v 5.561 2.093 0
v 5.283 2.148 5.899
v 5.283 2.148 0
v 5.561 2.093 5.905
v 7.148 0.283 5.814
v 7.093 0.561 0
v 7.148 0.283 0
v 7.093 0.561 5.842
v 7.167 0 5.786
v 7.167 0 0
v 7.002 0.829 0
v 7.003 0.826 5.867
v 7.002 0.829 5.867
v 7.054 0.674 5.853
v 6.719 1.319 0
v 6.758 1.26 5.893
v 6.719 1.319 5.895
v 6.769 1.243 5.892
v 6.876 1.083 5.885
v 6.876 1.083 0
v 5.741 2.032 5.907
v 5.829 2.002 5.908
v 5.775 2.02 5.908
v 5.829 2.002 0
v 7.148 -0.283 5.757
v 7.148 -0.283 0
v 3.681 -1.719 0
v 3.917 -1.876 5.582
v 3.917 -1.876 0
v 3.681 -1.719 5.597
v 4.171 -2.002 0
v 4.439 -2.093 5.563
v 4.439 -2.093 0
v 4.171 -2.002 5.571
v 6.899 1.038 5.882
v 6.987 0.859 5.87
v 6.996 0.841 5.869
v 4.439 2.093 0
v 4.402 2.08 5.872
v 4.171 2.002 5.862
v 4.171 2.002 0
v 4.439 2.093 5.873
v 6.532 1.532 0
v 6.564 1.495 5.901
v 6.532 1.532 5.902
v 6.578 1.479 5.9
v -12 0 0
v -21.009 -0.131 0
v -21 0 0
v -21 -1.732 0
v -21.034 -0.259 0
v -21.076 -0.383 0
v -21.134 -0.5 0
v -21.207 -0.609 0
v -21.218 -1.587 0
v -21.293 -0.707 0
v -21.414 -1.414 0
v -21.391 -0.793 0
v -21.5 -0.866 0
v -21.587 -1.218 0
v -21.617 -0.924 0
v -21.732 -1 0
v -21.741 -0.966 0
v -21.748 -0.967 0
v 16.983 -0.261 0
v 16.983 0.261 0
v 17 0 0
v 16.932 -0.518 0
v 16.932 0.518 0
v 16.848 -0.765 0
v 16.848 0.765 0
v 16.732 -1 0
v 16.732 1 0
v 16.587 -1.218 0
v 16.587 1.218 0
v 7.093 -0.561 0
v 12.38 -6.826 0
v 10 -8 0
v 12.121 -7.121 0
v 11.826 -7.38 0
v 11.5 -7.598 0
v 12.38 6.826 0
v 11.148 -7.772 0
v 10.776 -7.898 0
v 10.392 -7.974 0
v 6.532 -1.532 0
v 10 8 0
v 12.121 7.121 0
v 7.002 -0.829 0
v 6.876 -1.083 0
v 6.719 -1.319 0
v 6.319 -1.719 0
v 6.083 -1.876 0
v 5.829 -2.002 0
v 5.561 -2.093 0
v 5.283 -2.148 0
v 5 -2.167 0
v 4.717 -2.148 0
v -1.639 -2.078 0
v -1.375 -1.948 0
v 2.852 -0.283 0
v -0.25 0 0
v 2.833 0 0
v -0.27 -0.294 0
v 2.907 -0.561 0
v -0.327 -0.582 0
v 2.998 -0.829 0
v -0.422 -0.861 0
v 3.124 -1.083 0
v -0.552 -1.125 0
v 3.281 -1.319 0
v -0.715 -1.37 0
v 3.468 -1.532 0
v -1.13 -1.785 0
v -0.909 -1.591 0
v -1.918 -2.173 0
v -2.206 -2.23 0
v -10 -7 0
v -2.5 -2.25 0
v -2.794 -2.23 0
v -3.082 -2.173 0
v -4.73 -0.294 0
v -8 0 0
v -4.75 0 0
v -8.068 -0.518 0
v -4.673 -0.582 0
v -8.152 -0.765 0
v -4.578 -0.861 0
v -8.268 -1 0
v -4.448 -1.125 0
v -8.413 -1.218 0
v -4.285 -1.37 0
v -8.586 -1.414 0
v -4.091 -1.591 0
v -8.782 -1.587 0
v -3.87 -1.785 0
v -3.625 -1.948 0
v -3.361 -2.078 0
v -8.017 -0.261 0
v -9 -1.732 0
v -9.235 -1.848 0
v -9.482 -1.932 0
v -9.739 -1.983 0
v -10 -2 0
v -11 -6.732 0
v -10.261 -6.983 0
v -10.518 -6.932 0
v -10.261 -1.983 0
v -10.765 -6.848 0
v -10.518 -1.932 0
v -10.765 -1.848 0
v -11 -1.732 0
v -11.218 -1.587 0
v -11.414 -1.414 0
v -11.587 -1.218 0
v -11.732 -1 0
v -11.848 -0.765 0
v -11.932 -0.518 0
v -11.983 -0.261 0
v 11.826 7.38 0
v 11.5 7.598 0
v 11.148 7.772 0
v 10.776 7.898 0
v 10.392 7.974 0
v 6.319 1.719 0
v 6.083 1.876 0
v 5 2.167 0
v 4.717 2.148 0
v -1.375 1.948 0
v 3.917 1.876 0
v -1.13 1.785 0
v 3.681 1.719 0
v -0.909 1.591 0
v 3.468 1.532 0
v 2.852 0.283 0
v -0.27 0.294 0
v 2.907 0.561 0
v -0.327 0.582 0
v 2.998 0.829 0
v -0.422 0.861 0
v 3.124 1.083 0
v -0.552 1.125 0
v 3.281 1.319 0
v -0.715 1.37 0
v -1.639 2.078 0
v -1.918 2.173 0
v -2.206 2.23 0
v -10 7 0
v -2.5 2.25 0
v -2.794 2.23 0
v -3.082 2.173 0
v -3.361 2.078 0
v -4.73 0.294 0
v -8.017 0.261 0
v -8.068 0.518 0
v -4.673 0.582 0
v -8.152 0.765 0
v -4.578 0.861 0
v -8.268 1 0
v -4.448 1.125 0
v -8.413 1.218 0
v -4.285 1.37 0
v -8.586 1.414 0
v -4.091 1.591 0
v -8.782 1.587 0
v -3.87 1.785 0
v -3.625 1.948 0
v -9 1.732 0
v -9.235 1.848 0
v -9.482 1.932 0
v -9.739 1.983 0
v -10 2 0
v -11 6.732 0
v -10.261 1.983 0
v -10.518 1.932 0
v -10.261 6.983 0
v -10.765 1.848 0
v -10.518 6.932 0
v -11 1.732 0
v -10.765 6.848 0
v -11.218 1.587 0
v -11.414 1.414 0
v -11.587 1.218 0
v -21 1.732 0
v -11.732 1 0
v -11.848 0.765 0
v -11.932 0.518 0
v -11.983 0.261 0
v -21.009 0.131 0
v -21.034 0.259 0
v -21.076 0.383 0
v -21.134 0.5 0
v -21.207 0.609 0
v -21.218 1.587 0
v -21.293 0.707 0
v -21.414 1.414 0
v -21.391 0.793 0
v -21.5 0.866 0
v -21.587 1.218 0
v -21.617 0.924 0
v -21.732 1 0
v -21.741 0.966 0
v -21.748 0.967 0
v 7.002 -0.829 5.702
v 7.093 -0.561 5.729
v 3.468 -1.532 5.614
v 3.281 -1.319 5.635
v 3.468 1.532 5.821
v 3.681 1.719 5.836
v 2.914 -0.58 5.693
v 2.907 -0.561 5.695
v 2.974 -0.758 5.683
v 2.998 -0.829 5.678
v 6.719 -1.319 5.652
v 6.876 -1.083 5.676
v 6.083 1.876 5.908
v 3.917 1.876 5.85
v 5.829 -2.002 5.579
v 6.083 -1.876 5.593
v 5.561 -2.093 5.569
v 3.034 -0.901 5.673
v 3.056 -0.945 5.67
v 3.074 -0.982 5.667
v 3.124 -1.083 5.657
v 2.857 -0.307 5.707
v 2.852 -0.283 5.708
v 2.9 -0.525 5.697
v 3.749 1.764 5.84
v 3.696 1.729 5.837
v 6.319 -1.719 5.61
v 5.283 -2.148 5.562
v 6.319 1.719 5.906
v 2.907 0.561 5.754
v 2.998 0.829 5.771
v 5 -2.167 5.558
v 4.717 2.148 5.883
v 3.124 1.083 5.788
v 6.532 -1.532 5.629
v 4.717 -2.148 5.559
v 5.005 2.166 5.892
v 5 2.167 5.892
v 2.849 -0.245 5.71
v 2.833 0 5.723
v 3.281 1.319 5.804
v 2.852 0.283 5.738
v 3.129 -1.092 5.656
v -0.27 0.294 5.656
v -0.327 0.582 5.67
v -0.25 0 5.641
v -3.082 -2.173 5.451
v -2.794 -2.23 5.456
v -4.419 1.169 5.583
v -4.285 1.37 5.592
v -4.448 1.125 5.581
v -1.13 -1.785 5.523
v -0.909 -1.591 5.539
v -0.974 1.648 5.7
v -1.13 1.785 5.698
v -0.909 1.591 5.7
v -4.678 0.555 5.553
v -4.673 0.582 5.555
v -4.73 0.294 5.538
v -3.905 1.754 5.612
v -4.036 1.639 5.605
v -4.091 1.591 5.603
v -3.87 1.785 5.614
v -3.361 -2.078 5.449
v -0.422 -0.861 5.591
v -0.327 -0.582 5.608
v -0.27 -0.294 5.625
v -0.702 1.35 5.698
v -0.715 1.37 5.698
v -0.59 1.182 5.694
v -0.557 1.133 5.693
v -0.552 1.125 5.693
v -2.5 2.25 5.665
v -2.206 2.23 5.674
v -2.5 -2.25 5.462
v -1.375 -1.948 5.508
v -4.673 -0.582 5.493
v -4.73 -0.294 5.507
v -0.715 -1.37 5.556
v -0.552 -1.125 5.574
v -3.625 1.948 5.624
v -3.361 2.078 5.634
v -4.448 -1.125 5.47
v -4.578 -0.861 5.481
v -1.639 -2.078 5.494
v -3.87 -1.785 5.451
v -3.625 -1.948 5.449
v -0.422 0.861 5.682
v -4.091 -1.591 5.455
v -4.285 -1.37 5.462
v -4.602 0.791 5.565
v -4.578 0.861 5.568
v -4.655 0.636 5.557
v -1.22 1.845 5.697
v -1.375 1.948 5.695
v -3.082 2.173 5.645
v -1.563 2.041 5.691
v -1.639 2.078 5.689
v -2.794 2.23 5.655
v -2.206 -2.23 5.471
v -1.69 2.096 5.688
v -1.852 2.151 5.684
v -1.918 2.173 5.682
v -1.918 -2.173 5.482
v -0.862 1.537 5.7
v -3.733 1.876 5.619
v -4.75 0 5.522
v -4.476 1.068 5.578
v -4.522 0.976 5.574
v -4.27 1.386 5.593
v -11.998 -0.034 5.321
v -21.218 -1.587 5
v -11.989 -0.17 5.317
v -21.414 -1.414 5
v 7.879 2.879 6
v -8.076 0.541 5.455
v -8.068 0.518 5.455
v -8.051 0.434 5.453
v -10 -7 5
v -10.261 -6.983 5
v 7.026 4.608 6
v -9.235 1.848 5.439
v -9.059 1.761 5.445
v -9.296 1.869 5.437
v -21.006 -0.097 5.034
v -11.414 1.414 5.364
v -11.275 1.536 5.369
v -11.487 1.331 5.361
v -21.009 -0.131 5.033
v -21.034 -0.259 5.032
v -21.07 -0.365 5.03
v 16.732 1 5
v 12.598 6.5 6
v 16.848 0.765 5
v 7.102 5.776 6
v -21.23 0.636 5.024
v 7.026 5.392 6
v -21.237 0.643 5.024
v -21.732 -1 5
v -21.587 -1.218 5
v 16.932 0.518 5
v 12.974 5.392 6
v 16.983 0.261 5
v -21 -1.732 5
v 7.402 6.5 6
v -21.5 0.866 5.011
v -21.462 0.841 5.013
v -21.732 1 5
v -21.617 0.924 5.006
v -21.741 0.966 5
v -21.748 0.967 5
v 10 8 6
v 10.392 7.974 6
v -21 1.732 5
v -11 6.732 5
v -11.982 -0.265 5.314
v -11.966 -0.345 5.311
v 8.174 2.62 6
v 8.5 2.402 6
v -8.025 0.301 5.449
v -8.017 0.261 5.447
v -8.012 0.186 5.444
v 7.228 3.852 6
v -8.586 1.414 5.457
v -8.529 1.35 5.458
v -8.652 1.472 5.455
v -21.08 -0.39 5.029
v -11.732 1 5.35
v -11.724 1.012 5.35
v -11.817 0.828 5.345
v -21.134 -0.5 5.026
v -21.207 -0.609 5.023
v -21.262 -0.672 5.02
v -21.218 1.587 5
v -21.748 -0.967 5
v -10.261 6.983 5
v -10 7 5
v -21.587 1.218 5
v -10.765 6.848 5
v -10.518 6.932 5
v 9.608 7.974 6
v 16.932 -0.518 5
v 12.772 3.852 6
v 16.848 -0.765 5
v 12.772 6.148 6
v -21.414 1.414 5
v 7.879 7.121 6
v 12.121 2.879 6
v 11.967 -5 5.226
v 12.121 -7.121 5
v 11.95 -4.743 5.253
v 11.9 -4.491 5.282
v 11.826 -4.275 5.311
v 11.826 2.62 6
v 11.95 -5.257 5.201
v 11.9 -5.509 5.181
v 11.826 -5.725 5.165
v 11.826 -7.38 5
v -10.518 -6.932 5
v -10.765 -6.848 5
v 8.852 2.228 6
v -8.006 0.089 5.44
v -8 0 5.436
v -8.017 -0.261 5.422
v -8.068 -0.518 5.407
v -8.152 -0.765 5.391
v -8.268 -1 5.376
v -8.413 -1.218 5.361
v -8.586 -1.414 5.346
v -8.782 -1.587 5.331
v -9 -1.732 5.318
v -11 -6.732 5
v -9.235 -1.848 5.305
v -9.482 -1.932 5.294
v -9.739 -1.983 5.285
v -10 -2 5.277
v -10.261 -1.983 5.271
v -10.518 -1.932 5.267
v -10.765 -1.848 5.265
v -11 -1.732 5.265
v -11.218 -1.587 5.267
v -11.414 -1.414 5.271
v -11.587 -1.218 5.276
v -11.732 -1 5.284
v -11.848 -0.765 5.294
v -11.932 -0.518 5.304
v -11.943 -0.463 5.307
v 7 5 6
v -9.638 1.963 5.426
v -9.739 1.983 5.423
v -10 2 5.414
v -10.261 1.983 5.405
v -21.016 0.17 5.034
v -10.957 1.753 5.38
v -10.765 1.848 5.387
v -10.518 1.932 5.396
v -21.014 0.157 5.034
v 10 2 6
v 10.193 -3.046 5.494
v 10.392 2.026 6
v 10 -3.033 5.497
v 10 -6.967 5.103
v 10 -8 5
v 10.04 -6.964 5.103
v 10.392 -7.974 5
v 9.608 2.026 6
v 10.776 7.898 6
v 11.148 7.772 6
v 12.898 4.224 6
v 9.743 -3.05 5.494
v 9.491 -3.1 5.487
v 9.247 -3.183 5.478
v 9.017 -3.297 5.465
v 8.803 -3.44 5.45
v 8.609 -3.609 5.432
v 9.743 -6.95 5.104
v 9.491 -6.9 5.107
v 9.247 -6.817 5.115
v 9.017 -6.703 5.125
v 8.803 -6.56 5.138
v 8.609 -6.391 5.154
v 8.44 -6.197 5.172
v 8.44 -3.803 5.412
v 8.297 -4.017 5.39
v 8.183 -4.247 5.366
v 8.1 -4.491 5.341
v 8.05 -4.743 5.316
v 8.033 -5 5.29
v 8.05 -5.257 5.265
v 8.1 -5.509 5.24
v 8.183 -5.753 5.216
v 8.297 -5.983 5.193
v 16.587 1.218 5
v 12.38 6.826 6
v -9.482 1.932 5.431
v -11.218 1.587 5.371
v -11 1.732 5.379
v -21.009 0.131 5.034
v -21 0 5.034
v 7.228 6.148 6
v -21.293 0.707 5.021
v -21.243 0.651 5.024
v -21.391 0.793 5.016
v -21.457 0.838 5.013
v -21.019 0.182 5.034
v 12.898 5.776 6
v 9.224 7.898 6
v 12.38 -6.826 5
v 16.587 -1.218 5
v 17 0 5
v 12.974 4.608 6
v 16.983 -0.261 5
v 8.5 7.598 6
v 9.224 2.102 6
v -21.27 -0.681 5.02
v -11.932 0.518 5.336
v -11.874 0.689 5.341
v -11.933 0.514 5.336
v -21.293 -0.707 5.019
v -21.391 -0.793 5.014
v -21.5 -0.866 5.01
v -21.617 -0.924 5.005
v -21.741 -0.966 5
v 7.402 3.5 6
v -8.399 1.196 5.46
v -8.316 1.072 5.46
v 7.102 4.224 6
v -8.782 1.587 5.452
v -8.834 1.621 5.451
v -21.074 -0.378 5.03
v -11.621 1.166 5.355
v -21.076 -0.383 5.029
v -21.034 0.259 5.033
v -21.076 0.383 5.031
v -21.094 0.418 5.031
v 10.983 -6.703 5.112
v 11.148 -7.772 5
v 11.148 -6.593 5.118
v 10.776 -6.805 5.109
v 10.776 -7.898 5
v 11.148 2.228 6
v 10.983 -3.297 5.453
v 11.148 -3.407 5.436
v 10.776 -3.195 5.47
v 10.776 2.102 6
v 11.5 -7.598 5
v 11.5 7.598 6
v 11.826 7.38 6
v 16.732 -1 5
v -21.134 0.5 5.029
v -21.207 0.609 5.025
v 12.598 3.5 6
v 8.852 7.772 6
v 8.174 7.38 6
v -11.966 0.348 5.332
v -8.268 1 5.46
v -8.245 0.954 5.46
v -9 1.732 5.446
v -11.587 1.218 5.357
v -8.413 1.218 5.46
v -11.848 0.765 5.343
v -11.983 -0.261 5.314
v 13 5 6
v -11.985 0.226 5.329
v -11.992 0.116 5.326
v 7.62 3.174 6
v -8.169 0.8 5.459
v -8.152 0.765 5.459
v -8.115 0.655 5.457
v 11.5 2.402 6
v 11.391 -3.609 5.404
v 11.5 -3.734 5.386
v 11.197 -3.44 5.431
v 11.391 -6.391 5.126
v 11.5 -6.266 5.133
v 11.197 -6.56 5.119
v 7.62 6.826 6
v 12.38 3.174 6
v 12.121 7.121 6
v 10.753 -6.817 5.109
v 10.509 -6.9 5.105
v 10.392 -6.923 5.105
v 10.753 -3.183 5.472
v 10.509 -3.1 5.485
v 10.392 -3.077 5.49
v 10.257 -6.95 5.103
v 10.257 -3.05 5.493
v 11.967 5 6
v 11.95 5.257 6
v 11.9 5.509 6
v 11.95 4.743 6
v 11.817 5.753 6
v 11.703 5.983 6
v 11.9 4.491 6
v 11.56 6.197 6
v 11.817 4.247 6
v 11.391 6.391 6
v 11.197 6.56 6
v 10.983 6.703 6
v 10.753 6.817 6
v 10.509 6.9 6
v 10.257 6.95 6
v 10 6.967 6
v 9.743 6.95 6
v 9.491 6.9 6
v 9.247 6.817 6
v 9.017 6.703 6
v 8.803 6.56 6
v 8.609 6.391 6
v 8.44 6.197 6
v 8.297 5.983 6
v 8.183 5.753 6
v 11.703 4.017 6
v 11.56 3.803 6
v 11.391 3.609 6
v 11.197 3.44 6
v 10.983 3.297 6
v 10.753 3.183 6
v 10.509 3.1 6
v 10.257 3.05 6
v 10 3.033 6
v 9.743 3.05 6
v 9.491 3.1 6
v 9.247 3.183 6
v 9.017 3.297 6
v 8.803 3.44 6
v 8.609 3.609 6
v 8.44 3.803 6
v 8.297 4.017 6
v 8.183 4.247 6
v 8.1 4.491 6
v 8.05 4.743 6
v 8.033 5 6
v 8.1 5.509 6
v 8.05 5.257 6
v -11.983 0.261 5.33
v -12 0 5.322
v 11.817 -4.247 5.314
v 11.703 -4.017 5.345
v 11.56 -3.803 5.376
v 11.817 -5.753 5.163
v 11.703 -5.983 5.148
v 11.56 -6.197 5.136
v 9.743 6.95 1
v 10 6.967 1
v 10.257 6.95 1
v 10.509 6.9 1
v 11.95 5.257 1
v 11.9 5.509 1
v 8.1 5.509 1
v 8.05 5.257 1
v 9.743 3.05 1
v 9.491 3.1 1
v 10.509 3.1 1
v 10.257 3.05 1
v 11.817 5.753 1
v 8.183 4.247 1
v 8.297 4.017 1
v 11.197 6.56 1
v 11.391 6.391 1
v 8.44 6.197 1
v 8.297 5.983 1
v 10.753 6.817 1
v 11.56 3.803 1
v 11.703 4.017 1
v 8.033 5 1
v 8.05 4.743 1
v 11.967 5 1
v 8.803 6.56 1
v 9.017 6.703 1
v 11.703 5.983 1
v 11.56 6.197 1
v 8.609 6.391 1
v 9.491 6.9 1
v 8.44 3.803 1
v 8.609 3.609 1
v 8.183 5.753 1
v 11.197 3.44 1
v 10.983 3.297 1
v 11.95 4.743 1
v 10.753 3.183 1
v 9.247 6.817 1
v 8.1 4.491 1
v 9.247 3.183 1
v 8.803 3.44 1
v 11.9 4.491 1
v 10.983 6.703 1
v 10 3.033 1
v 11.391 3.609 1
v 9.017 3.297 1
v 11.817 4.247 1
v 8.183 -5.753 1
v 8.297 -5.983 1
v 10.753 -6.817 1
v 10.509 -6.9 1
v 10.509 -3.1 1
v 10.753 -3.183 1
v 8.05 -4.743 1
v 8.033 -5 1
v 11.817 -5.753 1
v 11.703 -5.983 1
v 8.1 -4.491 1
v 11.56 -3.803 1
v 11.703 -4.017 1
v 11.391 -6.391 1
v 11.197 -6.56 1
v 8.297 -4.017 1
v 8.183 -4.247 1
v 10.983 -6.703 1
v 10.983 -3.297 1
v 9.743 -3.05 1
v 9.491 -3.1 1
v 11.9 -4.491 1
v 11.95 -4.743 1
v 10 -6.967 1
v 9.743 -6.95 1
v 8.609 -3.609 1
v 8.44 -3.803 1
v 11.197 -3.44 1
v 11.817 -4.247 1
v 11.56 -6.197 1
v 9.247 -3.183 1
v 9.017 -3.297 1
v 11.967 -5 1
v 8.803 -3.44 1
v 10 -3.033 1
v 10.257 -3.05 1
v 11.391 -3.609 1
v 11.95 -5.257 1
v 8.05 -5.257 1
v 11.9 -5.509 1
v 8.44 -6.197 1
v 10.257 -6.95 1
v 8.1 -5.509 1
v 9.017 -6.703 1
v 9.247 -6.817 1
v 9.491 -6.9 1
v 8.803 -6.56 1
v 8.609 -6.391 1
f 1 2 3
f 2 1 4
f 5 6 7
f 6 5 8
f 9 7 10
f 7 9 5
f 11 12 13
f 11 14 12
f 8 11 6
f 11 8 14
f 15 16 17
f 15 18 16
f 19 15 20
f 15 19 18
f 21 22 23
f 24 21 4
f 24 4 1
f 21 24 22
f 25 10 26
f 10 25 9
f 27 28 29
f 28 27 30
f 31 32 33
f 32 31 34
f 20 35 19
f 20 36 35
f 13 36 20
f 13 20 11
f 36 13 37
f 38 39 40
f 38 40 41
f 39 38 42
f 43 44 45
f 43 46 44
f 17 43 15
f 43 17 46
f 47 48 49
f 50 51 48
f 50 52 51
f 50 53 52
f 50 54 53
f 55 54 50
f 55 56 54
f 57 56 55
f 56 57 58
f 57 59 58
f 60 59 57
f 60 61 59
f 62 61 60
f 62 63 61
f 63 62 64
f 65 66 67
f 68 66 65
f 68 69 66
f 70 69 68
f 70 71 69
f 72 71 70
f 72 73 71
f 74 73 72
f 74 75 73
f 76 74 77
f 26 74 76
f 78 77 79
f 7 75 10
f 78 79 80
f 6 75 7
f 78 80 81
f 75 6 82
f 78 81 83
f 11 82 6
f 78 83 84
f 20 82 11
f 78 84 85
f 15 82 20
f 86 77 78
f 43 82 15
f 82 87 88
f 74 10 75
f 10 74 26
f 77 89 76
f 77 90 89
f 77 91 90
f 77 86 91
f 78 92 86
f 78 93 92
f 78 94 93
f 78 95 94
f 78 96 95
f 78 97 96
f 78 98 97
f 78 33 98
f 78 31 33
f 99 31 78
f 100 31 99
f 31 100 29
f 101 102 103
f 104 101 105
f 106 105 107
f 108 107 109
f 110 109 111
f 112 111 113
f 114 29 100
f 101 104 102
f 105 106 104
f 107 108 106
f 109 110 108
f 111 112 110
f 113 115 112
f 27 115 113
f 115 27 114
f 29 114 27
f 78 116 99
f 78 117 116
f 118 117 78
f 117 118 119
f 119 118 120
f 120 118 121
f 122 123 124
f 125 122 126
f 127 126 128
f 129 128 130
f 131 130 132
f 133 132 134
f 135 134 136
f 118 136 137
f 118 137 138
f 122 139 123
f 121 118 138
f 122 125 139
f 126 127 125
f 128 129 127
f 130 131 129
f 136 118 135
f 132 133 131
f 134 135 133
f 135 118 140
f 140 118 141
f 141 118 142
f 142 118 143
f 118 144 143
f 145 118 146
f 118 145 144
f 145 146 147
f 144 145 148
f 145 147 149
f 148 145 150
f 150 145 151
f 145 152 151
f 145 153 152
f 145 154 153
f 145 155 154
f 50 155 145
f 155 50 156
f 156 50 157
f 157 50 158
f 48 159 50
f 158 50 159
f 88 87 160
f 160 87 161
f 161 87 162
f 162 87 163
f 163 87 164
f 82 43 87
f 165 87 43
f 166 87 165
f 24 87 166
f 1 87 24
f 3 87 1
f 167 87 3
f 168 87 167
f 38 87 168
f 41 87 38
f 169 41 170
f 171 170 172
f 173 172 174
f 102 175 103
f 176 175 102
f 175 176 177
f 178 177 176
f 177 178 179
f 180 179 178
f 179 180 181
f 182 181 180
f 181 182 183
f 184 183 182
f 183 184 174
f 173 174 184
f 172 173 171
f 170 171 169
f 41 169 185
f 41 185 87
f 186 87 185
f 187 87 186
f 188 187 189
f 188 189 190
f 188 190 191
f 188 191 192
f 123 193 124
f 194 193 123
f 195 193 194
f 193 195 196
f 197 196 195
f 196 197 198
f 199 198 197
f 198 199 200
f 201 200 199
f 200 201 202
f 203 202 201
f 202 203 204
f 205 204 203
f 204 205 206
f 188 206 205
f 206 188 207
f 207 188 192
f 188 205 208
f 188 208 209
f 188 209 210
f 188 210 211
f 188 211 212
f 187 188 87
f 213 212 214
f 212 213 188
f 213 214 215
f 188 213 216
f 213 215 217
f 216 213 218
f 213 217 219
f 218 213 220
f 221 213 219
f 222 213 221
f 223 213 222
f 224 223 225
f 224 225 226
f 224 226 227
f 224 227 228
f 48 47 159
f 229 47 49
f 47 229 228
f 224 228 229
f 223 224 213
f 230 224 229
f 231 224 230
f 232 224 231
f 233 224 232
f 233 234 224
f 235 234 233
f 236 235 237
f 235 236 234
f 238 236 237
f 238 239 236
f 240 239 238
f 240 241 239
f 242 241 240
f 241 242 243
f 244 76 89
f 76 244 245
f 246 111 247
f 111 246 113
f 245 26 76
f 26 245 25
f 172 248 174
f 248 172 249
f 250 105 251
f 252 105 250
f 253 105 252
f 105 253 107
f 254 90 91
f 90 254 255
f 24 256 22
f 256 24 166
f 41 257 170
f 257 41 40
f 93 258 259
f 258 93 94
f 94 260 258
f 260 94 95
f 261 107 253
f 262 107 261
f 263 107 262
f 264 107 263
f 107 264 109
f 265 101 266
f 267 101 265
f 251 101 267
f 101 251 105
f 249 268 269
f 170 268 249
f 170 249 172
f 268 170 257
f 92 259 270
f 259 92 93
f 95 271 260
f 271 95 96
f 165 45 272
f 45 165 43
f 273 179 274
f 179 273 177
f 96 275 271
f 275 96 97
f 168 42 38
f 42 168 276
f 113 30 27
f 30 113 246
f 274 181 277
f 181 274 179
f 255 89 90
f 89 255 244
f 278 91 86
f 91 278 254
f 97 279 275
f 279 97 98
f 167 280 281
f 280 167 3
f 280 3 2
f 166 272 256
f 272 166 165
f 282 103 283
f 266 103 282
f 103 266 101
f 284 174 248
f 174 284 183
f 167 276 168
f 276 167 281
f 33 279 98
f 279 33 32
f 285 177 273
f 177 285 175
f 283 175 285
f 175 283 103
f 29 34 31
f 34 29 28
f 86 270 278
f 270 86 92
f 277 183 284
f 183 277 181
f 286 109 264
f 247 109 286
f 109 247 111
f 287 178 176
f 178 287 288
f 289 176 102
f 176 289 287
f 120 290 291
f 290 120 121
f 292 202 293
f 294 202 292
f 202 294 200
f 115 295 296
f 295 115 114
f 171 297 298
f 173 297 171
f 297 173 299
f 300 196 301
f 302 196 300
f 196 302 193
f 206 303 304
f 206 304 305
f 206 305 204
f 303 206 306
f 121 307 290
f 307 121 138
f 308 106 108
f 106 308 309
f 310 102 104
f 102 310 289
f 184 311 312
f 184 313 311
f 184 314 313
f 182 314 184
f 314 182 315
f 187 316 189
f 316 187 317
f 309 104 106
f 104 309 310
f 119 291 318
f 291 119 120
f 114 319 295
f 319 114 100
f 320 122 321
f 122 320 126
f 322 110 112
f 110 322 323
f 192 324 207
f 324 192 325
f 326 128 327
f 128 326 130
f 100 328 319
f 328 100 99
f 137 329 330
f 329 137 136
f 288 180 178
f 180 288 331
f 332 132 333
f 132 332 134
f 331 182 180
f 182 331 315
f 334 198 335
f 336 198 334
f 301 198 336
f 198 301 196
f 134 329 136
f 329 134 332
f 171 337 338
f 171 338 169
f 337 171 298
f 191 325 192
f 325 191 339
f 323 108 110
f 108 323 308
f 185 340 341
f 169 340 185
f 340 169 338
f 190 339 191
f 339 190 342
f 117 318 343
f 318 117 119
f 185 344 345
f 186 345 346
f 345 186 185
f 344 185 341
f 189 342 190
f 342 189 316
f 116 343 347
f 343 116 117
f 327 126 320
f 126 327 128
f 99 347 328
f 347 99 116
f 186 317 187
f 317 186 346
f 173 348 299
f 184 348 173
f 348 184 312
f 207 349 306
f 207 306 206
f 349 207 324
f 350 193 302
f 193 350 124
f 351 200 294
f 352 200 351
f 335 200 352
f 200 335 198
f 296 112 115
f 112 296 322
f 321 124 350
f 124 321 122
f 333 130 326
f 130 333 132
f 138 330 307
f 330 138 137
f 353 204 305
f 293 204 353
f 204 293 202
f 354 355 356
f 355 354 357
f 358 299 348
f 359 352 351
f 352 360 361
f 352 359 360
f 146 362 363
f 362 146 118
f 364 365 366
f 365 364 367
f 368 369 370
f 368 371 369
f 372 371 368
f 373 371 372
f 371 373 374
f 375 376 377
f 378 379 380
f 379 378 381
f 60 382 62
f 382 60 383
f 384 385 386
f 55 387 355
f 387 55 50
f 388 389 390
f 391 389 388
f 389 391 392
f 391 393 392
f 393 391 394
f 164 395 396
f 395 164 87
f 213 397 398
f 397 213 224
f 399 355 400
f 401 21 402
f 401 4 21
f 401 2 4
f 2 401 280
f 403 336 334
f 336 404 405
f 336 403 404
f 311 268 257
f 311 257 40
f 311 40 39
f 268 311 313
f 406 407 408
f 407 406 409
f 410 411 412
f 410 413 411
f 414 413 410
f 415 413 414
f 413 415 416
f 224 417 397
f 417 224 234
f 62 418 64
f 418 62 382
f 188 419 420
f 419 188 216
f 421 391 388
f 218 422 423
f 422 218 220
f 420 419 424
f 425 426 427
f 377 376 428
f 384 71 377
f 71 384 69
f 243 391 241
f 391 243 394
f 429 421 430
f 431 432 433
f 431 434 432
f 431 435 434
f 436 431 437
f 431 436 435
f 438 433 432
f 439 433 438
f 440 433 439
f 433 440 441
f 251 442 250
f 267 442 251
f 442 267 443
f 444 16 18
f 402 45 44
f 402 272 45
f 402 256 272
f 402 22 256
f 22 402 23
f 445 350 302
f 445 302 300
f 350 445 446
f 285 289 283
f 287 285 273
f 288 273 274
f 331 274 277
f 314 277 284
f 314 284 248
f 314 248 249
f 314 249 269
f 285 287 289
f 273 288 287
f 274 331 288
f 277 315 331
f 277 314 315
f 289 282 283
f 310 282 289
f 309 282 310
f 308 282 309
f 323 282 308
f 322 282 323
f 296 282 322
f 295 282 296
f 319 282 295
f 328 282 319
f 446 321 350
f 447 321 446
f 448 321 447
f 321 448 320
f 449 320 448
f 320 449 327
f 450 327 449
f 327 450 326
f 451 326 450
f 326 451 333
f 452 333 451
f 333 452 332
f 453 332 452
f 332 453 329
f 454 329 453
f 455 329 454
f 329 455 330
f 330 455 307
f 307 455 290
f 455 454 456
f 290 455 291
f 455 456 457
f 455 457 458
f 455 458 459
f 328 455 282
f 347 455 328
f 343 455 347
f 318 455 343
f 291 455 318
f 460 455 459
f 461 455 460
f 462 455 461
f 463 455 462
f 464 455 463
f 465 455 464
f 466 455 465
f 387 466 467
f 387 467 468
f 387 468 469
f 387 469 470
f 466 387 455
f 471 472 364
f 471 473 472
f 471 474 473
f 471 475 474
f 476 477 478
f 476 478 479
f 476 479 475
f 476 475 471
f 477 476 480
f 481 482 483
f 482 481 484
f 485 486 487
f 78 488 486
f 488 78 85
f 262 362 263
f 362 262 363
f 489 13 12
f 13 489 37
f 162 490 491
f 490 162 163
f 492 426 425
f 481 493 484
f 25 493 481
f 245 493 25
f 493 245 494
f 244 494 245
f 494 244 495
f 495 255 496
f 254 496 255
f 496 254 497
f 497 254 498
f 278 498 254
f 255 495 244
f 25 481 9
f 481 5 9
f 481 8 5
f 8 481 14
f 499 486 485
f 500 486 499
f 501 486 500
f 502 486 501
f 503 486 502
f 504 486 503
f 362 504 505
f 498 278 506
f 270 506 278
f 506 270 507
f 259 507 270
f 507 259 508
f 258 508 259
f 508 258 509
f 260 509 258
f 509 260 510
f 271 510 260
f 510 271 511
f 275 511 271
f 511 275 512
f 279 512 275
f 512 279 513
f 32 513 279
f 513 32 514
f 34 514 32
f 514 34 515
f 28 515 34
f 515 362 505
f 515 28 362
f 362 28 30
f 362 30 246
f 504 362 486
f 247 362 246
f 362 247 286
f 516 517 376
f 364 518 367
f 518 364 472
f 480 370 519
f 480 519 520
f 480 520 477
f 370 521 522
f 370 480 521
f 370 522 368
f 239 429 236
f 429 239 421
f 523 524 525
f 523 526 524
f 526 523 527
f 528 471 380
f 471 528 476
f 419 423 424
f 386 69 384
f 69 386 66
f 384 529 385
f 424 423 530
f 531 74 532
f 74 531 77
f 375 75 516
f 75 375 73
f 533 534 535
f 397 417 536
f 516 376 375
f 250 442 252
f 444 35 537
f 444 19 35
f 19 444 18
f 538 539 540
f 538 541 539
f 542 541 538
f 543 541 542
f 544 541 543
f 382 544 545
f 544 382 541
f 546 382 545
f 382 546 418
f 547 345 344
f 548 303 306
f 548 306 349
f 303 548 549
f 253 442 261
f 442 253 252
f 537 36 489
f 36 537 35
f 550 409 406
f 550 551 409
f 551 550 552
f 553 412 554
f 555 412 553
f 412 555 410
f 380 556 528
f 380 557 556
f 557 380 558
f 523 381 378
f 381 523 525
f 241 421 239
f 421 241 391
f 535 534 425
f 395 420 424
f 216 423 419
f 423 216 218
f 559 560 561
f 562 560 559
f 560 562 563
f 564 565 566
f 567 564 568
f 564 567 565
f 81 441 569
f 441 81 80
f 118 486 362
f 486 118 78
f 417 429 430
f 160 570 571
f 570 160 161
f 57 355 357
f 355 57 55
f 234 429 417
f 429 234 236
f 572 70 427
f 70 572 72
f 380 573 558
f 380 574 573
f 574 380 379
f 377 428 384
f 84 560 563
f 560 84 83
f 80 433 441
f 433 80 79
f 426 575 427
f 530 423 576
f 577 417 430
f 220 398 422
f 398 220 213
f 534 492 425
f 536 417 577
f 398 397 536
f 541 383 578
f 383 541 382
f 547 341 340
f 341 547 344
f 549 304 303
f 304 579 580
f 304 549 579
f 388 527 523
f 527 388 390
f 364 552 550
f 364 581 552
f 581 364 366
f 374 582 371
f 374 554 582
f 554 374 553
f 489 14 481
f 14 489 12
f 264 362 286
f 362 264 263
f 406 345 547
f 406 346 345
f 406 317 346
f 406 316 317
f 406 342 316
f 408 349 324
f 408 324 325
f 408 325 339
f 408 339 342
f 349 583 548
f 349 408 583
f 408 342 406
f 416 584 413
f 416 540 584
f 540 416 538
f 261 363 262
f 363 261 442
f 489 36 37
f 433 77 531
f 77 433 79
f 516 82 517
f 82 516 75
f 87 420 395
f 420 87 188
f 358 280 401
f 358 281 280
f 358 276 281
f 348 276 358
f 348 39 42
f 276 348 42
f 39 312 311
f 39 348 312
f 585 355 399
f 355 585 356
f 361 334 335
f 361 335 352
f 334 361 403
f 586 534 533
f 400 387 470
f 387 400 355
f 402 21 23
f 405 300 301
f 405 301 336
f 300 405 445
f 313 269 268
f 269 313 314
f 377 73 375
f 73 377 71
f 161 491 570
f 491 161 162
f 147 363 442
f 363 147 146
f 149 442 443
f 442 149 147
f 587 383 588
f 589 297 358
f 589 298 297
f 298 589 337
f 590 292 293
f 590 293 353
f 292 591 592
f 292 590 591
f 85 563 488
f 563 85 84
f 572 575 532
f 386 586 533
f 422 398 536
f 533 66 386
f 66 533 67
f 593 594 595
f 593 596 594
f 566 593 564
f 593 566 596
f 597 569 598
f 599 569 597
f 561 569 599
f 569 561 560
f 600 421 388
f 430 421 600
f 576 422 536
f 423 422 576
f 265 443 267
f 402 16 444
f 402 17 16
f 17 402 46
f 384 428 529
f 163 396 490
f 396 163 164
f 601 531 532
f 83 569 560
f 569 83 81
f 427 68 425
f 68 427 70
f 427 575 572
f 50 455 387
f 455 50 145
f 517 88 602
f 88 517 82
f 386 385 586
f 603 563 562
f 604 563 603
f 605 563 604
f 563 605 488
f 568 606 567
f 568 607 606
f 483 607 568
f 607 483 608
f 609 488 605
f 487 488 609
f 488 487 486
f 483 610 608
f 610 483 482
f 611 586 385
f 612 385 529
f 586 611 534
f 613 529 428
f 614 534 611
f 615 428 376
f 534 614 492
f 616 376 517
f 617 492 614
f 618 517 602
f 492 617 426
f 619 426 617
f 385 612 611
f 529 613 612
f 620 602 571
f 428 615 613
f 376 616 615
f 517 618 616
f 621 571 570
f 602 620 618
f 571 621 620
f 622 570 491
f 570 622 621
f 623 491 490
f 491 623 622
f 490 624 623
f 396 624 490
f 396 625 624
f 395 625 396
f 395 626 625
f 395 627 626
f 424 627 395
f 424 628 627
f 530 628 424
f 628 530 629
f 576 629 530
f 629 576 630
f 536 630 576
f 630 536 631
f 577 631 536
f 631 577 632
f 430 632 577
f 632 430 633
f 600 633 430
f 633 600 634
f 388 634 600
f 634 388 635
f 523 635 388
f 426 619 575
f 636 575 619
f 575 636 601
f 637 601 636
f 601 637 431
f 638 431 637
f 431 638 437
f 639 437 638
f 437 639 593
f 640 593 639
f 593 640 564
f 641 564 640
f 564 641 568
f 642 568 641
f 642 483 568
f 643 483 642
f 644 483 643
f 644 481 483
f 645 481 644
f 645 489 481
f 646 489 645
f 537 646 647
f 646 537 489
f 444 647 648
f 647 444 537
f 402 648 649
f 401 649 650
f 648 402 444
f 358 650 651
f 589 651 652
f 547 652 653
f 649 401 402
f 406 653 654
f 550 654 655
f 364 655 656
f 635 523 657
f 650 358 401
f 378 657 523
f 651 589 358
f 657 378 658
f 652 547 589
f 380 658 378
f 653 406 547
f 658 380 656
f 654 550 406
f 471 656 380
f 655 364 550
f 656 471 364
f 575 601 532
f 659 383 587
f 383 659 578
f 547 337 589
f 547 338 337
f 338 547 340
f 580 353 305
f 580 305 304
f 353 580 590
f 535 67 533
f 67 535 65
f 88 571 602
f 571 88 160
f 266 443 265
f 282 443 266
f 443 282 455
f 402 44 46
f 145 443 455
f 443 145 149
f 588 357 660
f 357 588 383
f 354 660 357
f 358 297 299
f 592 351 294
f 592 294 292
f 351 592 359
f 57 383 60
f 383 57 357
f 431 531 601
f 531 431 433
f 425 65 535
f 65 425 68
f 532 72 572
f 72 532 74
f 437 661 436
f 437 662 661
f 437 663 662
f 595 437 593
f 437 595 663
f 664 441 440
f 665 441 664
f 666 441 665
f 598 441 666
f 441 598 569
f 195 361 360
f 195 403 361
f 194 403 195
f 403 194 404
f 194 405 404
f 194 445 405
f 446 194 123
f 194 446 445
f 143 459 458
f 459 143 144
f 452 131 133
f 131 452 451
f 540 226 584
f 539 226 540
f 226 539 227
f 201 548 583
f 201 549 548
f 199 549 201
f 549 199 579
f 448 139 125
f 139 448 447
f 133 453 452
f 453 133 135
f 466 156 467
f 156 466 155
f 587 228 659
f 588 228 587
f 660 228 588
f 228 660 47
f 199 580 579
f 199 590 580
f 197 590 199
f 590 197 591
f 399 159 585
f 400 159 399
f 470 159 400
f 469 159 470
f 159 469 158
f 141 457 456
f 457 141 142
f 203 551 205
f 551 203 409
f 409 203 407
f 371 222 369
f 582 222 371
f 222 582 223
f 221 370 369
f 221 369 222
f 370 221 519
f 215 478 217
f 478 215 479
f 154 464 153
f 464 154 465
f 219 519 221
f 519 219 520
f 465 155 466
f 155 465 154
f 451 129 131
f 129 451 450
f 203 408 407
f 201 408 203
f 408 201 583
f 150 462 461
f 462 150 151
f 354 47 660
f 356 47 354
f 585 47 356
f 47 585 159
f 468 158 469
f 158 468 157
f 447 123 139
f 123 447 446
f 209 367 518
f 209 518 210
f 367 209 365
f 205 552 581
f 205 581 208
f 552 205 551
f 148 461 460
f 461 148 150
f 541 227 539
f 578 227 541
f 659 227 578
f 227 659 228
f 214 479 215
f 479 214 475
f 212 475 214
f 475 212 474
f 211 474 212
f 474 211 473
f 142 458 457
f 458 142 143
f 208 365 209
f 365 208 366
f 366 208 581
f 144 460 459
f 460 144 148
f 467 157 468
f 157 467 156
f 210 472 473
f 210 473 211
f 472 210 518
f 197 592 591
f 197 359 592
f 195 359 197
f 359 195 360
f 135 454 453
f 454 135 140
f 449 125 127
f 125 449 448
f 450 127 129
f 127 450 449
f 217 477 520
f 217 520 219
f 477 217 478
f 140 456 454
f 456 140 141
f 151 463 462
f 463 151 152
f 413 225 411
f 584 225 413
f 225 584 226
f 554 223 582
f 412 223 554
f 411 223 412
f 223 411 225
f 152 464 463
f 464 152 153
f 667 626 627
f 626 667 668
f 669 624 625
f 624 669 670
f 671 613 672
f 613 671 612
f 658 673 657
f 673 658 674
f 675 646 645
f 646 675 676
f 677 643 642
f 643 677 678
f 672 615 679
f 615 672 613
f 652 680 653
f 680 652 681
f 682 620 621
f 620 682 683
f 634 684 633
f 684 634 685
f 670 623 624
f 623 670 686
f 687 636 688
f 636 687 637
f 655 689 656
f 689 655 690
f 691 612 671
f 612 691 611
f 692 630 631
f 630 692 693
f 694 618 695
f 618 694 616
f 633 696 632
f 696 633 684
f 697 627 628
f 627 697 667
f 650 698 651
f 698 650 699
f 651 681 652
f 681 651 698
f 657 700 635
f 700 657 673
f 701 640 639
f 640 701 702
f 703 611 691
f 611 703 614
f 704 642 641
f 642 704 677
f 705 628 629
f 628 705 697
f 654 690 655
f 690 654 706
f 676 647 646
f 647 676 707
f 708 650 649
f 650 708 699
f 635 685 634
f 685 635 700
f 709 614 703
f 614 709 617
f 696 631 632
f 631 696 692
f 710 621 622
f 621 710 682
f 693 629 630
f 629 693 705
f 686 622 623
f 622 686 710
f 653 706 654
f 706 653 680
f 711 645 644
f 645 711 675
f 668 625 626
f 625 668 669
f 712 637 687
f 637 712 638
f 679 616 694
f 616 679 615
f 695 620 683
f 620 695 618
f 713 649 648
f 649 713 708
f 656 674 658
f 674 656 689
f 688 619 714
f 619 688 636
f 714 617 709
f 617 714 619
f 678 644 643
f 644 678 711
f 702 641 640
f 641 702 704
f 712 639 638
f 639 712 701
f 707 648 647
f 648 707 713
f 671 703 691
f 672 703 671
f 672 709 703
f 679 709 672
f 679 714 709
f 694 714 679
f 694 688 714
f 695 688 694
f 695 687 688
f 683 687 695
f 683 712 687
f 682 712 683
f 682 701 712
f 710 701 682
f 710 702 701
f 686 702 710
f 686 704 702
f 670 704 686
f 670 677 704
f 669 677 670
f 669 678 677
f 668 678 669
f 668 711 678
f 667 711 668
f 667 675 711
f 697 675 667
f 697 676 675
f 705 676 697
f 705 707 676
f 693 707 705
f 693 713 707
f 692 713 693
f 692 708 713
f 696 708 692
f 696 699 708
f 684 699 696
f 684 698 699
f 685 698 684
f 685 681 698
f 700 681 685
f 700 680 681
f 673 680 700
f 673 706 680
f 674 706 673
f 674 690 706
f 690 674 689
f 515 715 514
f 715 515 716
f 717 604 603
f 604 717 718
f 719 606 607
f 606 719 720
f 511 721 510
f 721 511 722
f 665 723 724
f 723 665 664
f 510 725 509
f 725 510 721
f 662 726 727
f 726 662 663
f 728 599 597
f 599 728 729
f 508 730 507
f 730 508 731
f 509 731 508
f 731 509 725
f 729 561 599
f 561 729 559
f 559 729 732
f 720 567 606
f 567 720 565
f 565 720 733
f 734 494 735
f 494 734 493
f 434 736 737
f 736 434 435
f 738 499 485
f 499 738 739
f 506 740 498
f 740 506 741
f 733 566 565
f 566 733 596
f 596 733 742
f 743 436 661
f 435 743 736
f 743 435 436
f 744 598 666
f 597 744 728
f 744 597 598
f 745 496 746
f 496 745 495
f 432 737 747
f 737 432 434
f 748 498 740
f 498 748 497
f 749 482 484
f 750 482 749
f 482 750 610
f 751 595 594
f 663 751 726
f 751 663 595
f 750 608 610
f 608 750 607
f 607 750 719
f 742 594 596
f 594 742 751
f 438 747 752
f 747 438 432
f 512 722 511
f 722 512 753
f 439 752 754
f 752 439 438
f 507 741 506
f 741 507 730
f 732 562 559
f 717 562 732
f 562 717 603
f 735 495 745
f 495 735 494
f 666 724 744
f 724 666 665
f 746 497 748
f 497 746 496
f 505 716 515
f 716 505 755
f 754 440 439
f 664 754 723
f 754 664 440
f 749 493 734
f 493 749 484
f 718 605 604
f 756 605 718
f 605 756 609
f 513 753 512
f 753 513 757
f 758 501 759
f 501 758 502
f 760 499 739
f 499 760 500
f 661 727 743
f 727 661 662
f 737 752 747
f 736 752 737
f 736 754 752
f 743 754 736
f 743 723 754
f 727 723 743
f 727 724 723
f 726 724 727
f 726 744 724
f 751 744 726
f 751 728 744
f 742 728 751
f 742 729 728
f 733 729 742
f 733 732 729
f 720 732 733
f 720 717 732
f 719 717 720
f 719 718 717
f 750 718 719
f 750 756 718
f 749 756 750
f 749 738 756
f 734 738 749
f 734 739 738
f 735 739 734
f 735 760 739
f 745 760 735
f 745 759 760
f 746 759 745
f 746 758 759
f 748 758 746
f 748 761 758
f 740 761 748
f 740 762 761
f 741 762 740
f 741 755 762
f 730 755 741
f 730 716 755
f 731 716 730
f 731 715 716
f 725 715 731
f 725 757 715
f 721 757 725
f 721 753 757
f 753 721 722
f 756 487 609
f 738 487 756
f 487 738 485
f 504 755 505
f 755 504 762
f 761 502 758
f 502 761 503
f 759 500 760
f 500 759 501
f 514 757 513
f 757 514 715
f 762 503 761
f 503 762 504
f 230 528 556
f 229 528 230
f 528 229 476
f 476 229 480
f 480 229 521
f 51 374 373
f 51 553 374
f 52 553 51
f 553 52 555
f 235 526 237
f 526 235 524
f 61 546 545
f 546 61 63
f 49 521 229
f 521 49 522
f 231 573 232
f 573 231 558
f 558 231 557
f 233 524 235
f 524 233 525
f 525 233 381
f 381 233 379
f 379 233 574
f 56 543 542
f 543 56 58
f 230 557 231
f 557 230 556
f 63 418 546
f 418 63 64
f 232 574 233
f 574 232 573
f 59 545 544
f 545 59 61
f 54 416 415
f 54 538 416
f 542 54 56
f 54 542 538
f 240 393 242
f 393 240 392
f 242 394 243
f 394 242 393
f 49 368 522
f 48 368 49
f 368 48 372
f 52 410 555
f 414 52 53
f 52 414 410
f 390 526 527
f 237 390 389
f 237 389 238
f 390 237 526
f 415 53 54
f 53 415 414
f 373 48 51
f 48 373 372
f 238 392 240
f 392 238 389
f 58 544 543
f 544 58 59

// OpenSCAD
// file: OpenSCAD-Hardware/FFM_Functions.scad
// *********************************************************************************************************************
// ( )/ )(_  _)(_  _)___(  _ \(  _  )(  _ \(  _  )(_  _)(_  _)/ __)/ __)
//  )  (  _)(_   )( (___))   / )(_)(  ) _ < )(_)(   )(   _)(_( (__ \__ \
// (_)\_)(____) (__)    (_)\_)(_____)(____/(_____) (__) (____)\___)(___/
// *********************************************************************************************************************
// Written by bcantin@kitchissippi-robotics.com
// Copyright (c) 2015-2016 Kitchissippi Robotics
// ---------------------------------------------------------------------------------------------------------------------
// Common Hardware
// *********************************************************************************************************************

// ---------------------------------------------------------------------------------------------------------------------
// FFM Printer Compensation Functions
// .....................................................................................................................

if (undef == NOZZLE_SIZE) {
	NOZZLE_SIZE = 0.4;
}

function HW_Hole(diameter) = (diameter <= 10 ? diameter + (NOZZLE_SIZE /3) * 2: diameter);

//function HW_Hole(diameter) = diameter + 0.25;
// file: OpenSCAD-Hardware/HW_Bolts.scad
// *********************************************************************************************************************
// ( )/ )(_  _)(_  _)___(  _ \(  _  )(  _ \(  _  )(_  _)(_  _)/ __)/ __)
//  )  (  _)(_   )( (___))   / )(_)(  ) _ < )(_)(   )(   _)(_( (__ \__ \
// (_)\_)(____) (__)    (_)\_)(_____)(____/(_____) (__) (____)\___)(___/
// *********************************************************************************************************************
// Written by bcantin@kitchissippi-robotics.com
// Copyright (c) 2015-2016 Kitchissippi Robotics
// ---------------------------------------------------------------------------------------------------------------------
// Bolt_Hardware.scad
// *********************************************************************************************************************

// ---------------------------------------------------------------------------------------------------------------------
// Vector Indexes
// .....................................................................................................................
// To make parametric items easier to work with, their values are stored in an array which can be indexed by the
// scripting functions and allow for defining hardware items with a single variable.
// .....................................................................................................................

// Vector for sizing bolts: [HeadDiameter, HeadHeight, ShaftDiameter]
iBolt_HeadDiameter 	= 0;	// diameter of the bolt head
iBolt_HeadHeight 	= 1;	// height of the bolt head
iBolt_ShaftDiameter = 2;	// shaft diameter of the bolt
iBolt_HeadStyle 	= 3;

// Vector for sizing nuts: 	[NutDiameter, NutThickness, NutFaces]
iNut_Diameter 		= 0;	// diameter of the widest part of the nut
iNut_Thickness 		= 1;	// thickness of the nut
iNut_Faces 			= 2;	// number edges/faces to the nut

// Indexing for Head Styles
iBoltHead_Allen 	= 0;
iBoltHead_Hex 		= 1;
iBoltHead_Pan 		= 2;

// ---------------------------------------------------------------------------------------------------------------------
// Facet Sizes
// .....................................................................................................................

if (undef == RENDER_LEVEL) {
	RENDER_LEVEL = 1;
}

gcFacetSmall 		= 16 * RENDER_LEVEL;
gcFacetMedium 		= 24 * RENDER_LEVEL;
gcFacetLarge 		= 32 * RENDER_LEVEL;

gcRender_Screen		= 1;	// low render level, faster for development
gcRender_Draft		= 2;	// more facets for draft printing
gcRender_Production	= 4;	// lots of facets, really smooth curves

// *********************************************************************************************************************

// ---------------------------------------------------------------------------------------------------------------------
// Metric Bolt Hardware - Allen Key head
// .....................................................................................................................

hwM3_Bolt_AllenHead = [5.4, 2.8, 3, iBoltHead_Allen];	// [HeadDiameter, HeadHeight, ShaftDiameter]
hwM4_Bolt_AllenHead = [6.8, 4.3, 4, iBoltHead_Allen]; 	// [HeadDiameter, HeadHeight, ShaftDiameter]

// ---------------------------------------------------------------------------------------------------------------------
// Metric Bolt Hardware - Hex Wrench head
// .....................................................................................................................

// Hex Wrench style head
hwM4_Bolt_HexHeadDiameter = 7.8;
hwM4_Bolt_HexHeadHeight = 2.8;

// ---------------------------------------------------------------------------------------------------------------------
// SAE Bolt Hardware - Pan head
// .....................................................................................................................

hwNo8_Bolt_PanHead 	= [7, 	3.25, 	4.166, iBoltHead_Pan];		// Measured from actual bolt
hwNo10_Bolt_PanHead = [8.5, 3.25, 	4.826, iBoltHead_Pan];		// Measured from actual bolt

// *********************************************************************************************************************

include <FFM_Functions.scad>

// ---------------------------------------------------------------------------------------------------------------------
// Draw Bolt
// .....................................................................................................................

module Draw_hwBolt(_boltSize, _boltLength) {
	% union() {
		// bolt shaft
		cylinder(h = _boltLength, d = _boltSize[iBolt_ShaftDiameter], center = false);

		// bolt head Allen Key type
		if (_boltSize[iBolt_HeadStyle] == iBoltHead_Allen) {
			difference() {
				translate([0,0,_boltLength])
					cylinder(h = _boltSize[iBolt_HeadHeight], d = _boltSize[iBolt_HeadDiameter], $fn=gcFacetSmall, center = false);
				translate([0,0,_boltLength  + 1])
					cylinder(h = _boltSize[iBolt_HeadHeight], d = _boltSize[iBolt_HeadDiameter] / 2, $fn=gcFacetSmall, center = false);
			}
		} else if (_boltSize[iBolt_HeadStyle] == iBoltHead_Pan) {
			hull() {
				translate([0,0,_boltLength])
						cylinder(h = _boltSize[iBolt_HeadHeight] / 3, d = _boltSize[iBolt_HeadDiameter], $fn=gcFacetSmall, center = false);
				translate([0,0,_boltLength])
						cylinder(h = _boltSize[iBolt_HeadHeight], d = _boltSize[iBolt_ShaftDiameter], $fn=gcFacetSmall, center = false);
			}
		}
	}
}

// ---------------------------------------------------------------------------------------------------------------------
// Carve Bolt Hole
// .....................................................................................................................

module Carve_hwBolt(_boltSize, _boltLength, _headClearance = 0) {
	// hole for bolt shaft
	cylinder(h = _boltLength, d = HW_Hole(_boltSize[iBolt_ShaftDiameter]), $fn=gcFacetSmall, center = false);
	translate([0,0,_boltLength])
		cylinder(h = HW_Hole(_boltSize[iBolt_HeadHeight]) + _headClearance, d = HW_Hole(_boltSize[iBolt_HeadDiameter]), $fn=gcFacetSmall, center = false);
}
// main file
// Temporary test file to test some maths
RENDER_LEVEL = 3;
NOZZLE_SIZE = 0.5;
include <OpenSCAD-Hardware/HW_Bolts.scad>

//include <OpenSCAD-Hardware/FFM_Functions.scad>

difference() {
	hull() {
		translate([15,0,0])
			cylinder(h = 5, d = 4, $fn=gcFacetSmall);

		translate([10,5,0])
			cylinder(h = 6, d = 6, $fn=gcFacetSmall);

		translate([-10,5,0])
			cylinder(h = 5, d = 4, $fn=gcFacetSmall);

		translate([-10,-5,0])
			cylinder(h = 5, d = 4, $fn=gcFacetSmall);

		translate([-20,0,0])
			cylinder(h = 5, d = 4, $fn=gcFacetSmall);

		translate([10,-5,0])
			cylinder(h = 5, d = 6, $fn=gcFacetSmall);
	}

	nozzleSize = 0.5;

	compensateOne = (nozzleSize * 0.75) *2;
	compensateTwo = (nozzleSize * 0.75) *2;

	translate([-10,0,-0.1])
		cylinder(h = 6, d = 4, $fn=gcFacetSmall);

	translate([5,0,0])
		Carve_hwBolt(hwM4_Bolt_AllenHead, 15);

	translate([5,0,0])
		Draw_hwBolt(hwM4_Bolt_AllenHead, 15);

	translate([-2.5,0,0])
		Carve_hwBolt(hwNo8_Bolt_PanHead, 15);

	translate([-2.5,0,0])
		Draw_hwBolt(hwNo8_Bolt_PanHead, 15);

	// pin hole test
	translate([10,5,1])
		cylinder(h = 5.2, d = HW_Hole(3.6), $fn=gcFacetSmall);

	translate([10,-5,1])
		cylinder(h = 5.2, d = HW_Hole(3.6), $fn=gcFacetSmall);

	translate([-22,0,-0.1])
		cylinder(h = 5.2, d = 2, $fn=gcFacetSmall);
}
